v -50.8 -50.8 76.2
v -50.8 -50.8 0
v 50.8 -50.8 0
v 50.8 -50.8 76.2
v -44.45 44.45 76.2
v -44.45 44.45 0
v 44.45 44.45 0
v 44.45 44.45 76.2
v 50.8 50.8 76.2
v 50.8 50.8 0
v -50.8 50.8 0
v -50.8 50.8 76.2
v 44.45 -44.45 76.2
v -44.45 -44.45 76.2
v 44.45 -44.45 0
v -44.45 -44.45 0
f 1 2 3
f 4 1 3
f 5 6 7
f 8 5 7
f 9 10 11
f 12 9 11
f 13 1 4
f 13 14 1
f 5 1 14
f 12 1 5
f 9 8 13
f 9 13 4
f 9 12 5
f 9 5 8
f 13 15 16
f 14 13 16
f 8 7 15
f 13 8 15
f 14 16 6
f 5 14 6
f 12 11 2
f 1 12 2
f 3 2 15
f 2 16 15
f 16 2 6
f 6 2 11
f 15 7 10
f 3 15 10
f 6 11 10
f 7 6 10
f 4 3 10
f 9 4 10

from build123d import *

# Parameters (mm, degrees)
F1_DEPTH = 76.2


with BuildPart() as f1:
    # F0 (on Top) → F1 (new body)
    with BuildSketch(Plane.XY):
        Polygon((50.8, -50.8), (50.8, 50.8), (0, 50.8), (-50.8, 50.8), (-50.8, -50.8), align=None)
        Polygon((-44.45, 44.45), (0, 44.45), (44.45, 44.45), (44.45, 0), (44.45, -44.45), (0, -44.45), (-44.45, -44.45), (-44.45, 0), align=None, mode=Mode.SUBTRACT)
    extrude(amount=F1_DEPTH)


solid = f1.part
